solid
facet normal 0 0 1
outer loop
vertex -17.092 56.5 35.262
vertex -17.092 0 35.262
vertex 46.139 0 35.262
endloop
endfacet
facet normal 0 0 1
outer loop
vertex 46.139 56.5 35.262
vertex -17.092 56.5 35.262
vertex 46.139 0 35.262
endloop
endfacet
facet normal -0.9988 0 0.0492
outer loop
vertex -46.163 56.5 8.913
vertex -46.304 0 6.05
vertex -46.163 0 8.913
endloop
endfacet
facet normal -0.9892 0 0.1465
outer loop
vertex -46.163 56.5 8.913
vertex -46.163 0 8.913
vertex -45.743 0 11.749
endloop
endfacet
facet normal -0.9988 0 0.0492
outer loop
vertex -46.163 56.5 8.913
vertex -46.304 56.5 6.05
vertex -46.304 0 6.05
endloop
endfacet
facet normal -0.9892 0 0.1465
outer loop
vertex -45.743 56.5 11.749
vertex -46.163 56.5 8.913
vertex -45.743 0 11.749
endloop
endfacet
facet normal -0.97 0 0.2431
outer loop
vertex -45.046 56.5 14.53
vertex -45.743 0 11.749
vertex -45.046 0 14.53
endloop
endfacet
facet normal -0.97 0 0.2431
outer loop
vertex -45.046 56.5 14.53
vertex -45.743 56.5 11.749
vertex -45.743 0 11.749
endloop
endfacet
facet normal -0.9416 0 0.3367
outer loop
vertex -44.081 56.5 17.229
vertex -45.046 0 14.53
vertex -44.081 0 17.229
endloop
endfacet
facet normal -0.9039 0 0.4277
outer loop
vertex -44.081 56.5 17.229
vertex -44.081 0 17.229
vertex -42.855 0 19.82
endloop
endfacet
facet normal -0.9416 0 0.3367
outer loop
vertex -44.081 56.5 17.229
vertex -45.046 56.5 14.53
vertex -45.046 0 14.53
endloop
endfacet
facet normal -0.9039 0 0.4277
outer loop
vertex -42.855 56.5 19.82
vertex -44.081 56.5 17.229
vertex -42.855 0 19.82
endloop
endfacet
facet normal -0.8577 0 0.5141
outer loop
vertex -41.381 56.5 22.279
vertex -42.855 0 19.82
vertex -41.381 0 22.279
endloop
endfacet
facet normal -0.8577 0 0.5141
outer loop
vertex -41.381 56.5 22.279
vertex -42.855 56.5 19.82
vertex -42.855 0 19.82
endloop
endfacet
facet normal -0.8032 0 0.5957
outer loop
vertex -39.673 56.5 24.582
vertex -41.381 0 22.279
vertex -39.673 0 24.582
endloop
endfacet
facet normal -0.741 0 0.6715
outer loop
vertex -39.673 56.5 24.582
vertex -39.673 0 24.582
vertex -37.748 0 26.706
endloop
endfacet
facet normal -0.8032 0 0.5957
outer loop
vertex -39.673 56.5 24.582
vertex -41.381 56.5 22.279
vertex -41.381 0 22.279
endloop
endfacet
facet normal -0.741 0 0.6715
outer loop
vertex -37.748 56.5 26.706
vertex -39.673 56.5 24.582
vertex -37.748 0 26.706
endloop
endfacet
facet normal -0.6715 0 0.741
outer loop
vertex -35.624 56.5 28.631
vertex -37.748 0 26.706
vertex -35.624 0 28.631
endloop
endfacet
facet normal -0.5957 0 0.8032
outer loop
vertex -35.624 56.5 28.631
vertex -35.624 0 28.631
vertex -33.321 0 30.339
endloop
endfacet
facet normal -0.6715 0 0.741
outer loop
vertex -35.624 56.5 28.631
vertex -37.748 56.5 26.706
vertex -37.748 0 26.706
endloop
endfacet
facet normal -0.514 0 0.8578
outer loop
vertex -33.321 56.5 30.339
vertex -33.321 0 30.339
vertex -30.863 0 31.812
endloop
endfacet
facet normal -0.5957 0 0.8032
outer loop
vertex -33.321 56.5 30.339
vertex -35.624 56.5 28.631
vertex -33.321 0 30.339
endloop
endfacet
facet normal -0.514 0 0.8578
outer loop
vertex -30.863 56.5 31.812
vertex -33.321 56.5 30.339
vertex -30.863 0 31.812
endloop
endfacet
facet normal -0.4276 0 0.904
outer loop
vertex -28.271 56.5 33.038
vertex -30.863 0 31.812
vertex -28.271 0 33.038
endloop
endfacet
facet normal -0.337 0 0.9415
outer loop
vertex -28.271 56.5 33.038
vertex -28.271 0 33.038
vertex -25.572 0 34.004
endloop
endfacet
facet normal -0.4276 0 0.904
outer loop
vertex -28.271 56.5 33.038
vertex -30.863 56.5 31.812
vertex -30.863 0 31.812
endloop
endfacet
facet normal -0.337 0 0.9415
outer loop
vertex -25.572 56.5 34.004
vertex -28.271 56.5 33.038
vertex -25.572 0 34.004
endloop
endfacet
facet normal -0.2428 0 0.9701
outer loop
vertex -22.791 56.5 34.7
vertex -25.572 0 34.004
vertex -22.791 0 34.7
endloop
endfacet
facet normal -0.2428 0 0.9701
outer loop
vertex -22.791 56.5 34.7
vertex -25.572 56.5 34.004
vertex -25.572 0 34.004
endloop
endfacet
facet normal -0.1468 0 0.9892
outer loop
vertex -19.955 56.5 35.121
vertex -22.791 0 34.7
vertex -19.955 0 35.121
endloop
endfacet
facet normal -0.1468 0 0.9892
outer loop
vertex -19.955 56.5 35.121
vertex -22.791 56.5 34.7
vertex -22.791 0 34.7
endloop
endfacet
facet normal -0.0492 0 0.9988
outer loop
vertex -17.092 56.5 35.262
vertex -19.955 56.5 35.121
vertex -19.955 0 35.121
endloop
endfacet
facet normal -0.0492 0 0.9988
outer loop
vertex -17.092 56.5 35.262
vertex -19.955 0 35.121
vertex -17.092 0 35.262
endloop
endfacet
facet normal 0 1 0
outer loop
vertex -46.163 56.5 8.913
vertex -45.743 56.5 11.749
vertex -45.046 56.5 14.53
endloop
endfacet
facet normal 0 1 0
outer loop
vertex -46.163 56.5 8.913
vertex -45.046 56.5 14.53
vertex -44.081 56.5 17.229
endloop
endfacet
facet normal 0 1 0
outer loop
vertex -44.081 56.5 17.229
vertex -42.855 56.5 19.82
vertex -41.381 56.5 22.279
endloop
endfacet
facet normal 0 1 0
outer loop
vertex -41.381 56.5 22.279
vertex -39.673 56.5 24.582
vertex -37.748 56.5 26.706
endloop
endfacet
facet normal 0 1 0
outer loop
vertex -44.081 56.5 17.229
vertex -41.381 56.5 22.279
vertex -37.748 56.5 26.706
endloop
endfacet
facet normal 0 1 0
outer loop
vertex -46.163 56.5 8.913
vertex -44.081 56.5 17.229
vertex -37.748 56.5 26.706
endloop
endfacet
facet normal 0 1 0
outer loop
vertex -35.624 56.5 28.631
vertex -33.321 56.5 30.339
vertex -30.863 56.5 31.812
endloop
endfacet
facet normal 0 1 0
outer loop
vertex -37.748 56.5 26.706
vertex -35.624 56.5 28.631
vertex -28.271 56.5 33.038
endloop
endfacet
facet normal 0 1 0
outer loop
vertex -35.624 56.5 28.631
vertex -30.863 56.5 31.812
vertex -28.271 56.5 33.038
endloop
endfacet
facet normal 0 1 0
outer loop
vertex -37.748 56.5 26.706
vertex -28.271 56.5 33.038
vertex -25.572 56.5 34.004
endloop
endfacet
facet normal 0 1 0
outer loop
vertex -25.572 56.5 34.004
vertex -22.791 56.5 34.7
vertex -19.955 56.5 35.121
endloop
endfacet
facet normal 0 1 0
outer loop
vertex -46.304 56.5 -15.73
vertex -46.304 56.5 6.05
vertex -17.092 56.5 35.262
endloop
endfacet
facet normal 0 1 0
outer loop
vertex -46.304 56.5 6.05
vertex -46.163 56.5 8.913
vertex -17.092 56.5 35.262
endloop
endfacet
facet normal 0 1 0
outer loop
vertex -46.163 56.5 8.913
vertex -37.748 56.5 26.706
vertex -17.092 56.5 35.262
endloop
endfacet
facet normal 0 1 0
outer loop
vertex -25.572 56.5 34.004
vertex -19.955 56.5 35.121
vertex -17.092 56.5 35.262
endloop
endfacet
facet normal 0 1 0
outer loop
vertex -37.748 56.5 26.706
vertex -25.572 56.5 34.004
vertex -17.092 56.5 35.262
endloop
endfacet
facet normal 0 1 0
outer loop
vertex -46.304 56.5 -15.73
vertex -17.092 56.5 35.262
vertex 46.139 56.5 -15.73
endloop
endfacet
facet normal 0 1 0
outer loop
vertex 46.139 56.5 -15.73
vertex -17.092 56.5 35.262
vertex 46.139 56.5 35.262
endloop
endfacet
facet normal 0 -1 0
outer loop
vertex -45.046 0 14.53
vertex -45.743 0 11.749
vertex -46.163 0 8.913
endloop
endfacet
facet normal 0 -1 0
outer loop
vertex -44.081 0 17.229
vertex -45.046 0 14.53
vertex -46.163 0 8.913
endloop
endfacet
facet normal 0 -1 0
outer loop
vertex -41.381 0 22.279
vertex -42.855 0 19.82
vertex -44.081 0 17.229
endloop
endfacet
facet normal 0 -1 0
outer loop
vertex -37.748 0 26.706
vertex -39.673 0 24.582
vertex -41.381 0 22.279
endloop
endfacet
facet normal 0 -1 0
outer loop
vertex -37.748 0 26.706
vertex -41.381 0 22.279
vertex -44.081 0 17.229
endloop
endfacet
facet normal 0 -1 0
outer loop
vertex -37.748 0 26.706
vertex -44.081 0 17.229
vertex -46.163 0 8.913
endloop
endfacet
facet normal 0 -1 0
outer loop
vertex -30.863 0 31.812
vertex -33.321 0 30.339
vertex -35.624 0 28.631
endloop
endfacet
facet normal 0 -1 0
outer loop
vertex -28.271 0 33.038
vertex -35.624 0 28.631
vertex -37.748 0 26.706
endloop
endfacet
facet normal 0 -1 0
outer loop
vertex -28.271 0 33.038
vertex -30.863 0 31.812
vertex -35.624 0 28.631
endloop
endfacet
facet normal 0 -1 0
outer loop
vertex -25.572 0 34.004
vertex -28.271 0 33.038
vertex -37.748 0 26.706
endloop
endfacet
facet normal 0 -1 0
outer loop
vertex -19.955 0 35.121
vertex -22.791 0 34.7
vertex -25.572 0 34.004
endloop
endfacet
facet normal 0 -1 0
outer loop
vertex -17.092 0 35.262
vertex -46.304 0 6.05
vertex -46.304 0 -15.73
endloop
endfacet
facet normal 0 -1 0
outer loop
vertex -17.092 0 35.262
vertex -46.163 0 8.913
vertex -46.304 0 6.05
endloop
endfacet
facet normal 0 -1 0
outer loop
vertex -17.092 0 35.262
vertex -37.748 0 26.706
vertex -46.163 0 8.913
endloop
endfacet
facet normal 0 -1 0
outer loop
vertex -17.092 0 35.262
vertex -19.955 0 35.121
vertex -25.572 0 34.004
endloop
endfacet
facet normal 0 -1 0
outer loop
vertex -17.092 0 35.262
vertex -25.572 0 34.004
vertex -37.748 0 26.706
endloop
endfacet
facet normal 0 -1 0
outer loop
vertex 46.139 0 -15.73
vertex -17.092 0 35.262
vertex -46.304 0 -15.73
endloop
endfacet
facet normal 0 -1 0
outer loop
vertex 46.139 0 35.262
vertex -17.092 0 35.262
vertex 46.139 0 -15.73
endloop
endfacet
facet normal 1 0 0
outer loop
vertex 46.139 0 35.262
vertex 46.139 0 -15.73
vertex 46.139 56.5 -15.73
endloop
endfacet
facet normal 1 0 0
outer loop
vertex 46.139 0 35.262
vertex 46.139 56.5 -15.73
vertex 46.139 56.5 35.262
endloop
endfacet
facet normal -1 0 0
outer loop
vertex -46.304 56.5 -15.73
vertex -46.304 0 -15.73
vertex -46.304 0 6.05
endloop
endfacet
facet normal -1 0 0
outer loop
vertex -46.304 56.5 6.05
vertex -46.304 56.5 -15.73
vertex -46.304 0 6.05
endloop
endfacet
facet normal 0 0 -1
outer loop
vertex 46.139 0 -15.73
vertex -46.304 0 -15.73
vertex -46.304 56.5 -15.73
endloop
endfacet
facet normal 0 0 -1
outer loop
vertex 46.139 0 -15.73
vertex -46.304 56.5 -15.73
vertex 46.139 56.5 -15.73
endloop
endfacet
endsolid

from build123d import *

# Parameters (mm, degrees)
F0_W     = 92.442896
F0_H     = 50.99131
F1_DEPTH = 56.5
F2_R     = 29.211984


with BuildPart() as f1:
    # F0 (on Front) → F1 (new body)
    with BuildSketch(Plane.XZ):
        with Locations((-0.082703, 9.766088)):
            Rectangle(F0_W, F0_H)
    extrude(amount=-F1_DEPTH)

    # F2
    f2_edges = [f1.edges().sort_by_distance(p)[0] for p in [
        (-46.304151, 28.25, 35.261743),
    ]]
    fillet(f2_edges, radius=F2_R)


solid = f1.part
